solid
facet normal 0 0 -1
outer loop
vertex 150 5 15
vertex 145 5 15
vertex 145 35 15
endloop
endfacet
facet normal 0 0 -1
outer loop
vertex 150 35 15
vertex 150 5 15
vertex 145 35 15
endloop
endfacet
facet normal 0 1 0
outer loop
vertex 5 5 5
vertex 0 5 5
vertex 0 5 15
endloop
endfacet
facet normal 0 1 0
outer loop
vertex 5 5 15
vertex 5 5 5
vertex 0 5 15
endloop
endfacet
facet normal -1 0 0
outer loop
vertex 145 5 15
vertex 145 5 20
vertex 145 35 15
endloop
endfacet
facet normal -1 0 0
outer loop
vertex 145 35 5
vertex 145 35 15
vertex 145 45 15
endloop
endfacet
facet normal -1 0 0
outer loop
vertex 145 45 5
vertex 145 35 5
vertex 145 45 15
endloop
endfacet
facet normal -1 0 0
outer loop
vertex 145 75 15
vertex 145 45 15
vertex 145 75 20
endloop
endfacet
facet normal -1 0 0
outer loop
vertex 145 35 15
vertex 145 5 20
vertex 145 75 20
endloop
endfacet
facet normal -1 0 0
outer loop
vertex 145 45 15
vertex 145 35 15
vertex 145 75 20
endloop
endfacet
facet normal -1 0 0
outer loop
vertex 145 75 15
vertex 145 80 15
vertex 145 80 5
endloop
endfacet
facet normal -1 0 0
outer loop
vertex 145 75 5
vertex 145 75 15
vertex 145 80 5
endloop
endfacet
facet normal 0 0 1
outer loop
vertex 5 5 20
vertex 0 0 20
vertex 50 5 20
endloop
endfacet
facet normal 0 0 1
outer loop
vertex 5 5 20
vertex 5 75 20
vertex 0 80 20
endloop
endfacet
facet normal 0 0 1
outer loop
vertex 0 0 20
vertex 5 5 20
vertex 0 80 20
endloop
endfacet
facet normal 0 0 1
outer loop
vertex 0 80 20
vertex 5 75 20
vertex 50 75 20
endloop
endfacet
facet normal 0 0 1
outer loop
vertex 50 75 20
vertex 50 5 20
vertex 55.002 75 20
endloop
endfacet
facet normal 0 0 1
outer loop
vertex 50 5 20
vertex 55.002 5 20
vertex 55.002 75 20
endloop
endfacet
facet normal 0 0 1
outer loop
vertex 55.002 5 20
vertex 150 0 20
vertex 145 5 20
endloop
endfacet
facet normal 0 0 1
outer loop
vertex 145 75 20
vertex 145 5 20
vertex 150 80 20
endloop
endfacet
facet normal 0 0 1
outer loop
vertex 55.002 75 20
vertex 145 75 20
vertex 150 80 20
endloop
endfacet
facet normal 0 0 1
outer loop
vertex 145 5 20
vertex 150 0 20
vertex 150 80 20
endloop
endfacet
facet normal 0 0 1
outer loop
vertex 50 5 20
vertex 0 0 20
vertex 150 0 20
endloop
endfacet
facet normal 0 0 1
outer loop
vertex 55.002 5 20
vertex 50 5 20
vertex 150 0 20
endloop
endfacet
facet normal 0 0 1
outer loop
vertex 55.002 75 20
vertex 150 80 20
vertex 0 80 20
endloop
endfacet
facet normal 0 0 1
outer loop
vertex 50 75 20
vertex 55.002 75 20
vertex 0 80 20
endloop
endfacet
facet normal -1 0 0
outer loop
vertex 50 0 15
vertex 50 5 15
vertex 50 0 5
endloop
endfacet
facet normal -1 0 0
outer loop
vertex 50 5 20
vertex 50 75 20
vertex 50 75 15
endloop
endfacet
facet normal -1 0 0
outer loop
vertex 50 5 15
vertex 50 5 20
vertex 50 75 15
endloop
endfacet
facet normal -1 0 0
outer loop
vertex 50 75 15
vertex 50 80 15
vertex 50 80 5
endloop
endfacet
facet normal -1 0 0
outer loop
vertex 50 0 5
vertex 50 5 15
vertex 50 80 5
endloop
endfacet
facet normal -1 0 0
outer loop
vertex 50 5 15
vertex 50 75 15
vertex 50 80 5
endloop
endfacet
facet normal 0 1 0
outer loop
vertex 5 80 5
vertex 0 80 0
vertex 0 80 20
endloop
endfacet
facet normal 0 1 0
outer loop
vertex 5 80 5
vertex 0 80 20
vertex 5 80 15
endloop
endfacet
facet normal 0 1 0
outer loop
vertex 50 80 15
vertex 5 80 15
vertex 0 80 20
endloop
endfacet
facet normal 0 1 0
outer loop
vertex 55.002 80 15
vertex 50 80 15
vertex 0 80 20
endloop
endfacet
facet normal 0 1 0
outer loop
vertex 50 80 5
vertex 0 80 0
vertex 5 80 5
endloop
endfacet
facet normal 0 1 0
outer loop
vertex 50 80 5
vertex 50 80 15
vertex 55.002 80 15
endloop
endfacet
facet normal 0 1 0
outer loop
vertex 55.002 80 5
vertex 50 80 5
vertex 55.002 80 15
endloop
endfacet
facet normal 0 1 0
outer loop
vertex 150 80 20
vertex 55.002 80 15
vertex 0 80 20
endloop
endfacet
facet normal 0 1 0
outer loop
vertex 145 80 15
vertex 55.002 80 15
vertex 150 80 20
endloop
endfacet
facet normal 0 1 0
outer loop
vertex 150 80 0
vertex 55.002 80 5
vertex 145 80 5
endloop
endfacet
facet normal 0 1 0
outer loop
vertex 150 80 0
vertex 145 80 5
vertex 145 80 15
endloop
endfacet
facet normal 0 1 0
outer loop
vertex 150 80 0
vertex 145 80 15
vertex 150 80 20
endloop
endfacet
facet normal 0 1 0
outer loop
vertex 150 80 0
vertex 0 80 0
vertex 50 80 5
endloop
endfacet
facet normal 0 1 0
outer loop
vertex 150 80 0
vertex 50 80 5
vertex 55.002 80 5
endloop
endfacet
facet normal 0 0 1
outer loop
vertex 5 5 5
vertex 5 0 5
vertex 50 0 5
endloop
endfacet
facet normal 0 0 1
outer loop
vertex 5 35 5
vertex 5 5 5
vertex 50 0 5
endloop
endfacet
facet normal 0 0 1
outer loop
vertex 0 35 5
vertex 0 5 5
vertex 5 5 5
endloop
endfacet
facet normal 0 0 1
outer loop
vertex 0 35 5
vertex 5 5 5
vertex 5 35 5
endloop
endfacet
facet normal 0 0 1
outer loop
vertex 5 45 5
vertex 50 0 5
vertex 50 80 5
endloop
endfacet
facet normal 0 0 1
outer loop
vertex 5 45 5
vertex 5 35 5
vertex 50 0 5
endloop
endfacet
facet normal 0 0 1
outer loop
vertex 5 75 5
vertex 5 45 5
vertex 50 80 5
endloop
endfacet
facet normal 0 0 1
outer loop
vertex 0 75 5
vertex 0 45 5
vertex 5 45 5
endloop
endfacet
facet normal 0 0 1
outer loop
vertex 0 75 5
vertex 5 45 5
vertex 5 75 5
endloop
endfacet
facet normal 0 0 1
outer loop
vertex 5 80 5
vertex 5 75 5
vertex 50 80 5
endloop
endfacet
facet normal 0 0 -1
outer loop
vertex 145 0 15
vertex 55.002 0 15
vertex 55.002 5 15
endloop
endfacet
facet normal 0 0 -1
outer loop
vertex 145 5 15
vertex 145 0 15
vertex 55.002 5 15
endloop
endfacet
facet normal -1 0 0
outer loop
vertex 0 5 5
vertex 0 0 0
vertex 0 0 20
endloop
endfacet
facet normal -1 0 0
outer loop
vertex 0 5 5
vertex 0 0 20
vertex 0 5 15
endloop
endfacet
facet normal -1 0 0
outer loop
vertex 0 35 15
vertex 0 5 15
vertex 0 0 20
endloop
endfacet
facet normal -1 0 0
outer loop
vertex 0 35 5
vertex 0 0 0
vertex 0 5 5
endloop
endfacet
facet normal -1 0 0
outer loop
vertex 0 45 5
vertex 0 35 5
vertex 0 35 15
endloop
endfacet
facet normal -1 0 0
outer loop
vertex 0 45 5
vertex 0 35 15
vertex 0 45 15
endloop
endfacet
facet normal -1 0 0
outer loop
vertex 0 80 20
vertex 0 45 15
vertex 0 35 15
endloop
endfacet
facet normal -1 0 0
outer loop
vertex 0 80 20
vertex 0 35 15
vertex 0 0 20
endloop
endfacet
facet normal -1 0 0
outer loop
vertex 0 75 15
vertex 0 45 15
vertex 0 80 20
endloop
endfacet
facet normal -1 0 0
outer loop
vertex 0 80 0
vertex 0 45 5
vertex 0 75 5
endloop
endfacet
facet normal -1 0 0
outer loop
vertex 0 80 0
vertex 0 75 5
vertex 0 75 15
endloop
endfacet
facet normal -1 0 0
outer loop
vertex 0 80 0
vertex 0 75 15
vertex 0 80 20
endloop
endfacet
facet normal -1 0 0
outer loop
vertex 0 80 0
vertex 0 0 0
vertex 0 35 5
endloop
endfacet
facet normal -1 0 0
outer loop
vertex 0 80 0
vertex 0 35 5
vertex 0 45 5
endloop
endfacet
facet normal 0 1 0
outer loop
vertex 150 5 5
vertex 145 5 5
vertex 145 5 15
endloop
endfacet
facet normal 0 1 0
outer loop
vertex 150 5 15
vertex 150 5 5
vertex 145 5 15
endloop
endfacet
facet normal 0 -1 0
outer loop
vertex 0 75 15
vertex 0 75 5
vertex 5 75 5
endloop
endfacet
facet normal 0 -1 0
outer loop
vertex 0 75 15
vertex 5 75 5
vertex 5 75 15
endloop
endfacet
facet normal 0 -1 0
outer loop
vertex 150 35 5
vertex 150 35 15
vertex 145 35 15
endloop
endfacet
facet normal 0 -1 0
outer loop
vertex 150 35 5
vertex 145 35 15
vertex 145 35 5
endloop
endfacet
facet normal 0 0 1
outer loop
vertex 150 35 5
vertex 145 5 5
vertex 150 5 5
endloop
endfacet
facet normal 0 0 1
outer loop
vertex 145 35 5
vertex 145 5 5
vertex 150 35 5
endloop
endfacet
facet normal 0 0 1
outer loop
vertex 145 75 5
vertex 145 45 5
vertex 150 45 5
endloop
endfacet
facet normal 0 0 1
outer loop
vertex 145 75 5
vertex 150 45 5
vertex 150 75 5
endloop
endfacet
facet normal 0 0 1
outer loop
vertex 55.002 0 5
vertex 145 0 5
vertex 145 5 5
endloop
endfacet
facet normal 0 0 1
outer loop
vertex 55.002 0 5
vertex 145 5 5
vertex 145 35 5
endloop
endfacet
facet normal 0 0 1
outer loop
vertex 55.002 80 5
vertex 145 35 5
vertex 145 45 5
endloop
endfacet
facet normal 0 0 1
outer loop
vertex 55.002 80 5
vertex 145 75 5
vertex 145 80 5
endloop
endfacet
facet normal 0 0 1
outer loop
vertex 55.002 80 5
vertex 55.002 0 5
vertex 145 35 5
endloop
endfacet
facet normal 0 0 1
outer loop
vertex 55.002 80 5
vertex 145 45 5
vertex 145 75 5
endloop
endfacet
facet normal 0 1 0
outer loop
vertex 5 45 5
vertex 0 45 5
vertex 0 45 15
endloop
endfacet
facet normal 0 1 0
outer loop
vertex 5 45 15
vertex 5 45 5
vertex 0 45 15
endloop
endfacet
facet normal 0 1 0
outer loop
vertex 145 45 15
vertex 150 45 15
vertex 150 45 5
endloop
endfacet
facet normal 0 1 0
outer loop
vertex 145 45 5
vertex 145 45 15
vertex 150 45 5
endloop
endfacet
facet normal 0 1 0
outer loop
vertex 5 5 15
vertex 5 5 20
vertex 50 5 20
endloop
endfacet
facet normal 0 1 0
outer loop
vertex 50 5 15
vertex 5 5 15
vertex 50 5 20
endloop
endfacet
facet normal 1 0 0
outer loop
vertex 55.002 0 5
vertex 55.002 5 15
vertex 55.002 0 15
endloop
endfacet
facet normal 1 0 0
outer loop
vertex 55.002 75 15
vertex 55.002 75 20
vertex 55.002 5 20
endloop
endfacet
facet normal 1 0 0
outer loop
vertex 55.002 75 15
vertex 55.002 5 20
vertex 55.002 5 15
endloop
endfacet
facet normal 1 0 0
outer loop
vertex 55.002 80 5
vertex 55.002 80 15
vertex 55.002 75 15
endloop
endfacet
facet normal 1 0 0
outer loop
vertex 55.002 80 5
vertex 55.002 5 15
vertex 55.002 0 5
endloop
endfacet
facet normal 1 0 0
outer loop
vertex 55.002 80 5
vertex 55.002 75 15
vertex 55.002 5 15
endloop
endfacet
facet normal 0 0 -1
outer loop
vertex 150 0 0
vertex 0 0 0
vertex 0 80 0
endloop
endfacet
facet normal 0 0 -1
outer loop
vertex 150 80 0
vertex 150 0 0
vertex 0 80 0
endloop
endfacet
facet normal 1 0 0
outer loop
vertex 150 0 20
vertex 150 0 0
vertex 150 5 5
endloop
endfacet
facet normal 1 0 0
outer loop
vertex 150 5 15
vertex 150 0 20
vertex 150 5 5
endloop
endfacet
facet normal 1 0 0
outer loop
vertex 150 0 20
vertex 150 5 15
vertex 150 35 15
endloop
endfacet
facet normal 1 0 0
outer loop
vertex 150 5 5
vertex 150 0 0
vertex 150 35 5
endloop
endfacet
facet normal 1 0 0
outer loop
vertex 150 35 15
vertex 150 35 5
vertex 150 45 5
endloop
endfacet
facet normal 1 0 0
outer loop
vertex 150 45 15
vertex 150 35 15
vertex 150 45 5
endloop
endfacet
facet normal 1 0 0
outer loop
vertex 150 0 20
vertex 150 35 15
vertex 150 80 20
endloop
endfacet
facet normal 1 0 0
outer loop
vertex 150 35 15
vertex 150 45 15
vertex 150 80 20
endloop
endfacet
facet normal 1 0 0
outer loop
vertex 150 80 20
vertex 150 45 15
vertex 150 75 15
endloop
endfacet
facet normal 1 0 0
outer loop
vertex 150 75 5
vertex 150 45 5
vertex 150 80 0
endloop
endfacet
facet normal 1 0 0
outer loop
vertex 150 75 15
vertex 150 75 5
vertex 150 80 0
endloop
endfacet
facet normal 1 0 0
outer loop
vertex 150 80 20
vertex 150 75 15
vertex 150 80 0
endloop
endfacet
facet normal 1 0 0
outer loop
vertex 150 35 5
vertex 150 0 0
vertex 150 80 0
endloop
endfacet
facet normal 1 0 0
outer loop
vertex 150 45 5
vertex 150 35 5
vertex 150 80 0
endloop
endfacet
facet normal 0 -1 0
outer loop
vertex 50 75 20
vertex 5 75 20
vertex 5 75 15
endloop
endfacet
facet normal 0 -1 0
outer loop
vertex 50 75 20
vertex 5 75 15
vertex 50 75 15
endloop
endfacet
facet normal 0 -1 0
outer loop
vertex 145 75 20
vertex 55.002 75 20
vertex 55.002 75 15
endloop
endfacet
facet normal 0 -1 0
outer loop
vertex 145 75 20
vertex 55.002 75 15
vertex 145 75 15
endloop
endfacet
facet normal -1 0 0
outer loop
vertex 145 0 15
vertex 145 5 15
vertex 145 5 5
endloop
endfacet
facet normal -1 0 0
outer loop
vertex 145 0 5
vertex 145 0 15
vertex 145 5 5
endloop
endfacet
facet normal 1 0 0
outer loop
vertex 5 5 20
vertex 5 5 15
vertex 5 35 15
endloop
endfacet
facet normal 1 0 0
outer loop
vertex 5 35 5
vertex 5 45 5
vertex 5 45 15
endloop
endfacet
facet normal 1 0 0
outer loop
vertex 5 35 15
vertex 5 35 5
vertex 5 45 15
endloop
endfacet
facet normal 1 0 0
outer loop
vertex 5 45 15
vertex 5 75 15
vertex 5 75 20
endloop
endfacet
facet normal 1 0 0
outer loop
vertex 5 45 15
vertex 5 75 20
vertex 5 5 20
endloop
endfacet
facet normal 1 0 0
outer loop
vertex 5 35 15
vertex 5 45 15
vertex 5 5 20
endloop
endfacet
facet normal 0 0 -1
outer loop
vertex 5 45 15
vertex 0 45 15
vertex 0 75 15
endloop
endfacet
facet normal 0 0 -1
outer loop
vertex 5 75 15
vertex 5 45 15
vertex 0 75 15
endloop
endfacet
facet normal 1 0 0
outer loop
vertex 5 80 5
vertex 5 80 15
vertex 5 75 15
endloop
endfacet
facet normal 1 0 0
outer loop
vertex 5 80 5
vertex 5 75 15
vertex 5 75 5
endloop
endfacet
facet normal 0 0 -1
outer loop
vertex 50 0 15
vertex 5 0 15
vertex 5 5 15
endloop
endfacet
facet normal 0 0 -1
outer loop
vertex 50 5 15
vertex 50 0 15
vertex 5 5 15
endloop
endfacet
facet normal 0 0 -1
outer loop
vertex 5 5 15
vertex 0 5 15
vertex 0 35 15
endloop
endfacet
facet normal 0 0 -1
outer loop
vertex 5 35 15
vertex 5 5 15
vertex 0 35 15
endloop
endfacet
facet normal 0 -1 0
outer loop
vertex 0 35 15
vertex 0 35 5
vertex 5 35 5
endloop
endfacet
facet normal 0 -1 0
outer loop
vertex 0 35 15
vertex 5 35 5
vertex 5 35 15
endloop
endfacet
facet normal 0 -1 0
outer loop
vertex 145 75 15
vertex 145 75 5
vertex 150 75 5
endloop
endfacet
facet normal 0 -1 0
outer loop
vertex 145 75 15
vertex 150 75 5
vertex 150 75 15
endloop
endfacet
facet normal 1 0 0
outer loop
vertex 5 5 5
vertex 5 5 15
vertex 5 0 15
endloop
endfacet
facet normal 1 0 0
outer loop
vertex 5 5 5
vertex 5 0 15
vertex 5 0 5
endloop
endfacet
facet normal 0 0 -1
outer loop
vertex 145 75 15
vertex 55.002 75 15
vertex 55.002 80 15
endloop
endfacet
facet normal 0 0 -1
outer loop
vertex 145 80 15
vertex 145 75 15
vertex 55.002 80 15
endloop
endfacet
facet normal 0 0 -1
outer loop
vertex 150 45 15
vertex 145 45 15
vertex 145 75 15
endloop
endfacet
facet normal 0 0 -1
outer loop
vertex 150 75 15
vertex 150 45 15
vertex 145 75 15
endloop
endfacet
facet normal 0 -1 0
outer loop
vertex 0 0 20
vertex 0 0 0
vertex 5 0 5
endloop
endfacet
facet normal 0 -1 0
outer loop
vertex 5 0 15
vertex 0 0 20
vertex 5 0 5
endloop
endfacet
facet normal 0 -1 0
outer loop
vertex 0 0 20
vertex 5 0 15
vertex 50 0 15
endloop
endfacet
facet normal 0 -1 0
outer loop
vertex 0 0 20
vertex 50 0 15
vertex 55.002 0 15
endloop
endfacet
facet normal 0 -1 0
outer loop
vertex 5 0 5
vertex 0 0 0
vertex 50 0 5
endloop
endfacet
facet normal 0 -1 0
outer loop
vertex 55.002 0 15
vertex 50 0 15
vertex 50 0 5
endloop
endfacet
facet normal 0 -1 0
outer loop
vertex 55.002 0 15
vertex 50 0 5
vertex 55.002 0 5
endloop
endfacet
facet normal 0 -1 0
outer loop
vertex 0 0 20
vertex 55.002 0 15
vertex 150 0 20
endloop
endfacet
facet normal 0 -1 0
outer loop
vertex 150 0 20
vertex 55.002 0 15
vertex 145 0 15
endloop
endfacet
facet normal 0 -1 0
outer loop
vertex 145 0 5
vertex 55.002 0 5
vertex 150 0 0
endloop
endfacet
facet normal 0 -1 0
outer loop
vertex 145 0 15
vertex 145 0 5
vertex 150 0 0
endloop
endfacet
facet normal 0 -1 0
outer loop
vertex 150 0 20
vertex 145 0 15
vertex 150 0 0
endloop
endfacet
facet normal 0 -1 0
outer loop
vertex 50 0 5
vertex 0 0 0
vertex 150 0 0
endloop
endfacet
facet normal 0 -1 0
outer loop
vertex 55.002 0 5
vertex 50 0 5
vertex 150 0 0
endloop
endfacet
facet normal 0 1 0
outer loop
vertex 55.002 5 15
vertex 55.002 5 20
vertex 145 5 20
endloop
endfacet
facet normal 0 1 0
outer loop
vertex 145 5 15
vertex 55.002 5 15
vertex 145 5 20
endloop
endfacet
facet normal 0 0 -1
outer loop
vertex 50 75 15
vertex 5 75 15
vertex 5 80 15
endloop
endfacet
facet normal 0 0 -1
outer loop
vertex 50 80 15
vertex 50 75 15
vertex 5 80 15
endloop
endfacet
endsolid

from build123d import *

# Parameters (mm, degrees)
ESBO_O1_W                = 150
ESBO_O1_H                = 80
RESSALTO_EXTRUS_O1_DEPTH = 20
ESBO_O2_W                = 140
ESBO_O2_H                = 10
CORTE_EXTRUS_O1_DEPTH    = 172.172427686
ESBO_O3_W                = 10
ESBO_O3_H                = 70
CORTE_EXTRUS_O2_DEPTH    = 172.172427686
ESBO_O4_W                = 45
ESBO_O4_H                = 70
ESBO_O4_W_2              = 90
CORTE_EXTRUS_O3_DEPTH    = 15
ESBO_O5_W                = 5.002119461
ESBO_O5_H                = 20
RESSALTO_EXTRUS_O2_DEPTH = 80
ESBO_O6_W                = 20
ESBO_O6_H                = 10
RESSALTO_EXTRUS_O3_DEPTH = 5
ESBO_O7_W                = 20
ESBO_O7_H                = 10
RESSALTO_EXTRUS_O4_DEPTH = 5


with BuildPart() as part:
    # Esboço1 → Ressalto-extrusão1 (new body)
    with BuildSketch(Plane.XY):
        with Locations((75, 40)):
            Rectangle(ESBO_O1_W, ESBO_O1_H)
    extrude(amount=RESSALTO_EXTRUS_O1_DEPTH)

    # Esboço2 → Corte-extrusão1 (cut, through all)
    with BuildSketch(Plane(origin=(0, 80, 0), x_dir=(1, 0, 0), z_dir=(0, 1, 0))):
        with Locations((75, -10)):
            Rectangle(ESBO_O2_W, ESBO_O2_H)
    extrude(amount=-CORTE_EXTRUS_O1_DEPTH, mode=Mode.SUBTRACT)

    # Esboço3 → Corte-extrusão2 (cut, through all)
    with BuildSketch(Plane.ZY):
        with Locations((10, 40)):
            Rectangle(ESBO_O3_W, ESBO_O3_H)
    extrude(amount=-CORTE_EXTRUS_O2_DEPTH, mode=Mode.SUBTRACT)

    # Esboço4 → Corte-extrusão3 (cut)
    with BuildSketch(Plane.XY.offset(20)):
        with Locations((27.5, 40)):
            Rectangle(ESBO_O4_W, ESBO_O4_H)
        with Locations((100, 40)):
            Rectangle(ESBO_O4_W_2, ESBO_O4_H)
    extrude(amount=-CORTE_EXTRUS_O3_DEPTH, mode=Mode.SUBTRACT)

    # Esboço5 → Ressalto-extrusão2 (add)
    with BuildSketch(Plane(origin=(0, 80, 0), x_dir=(1, 0, 0), z_dir=(0, 1, 0))):
        with Locations((52.501059731, -10)):
            Rectangle(ESBO_O5_W, ESBO_O5_H)
    extrude(amount=-RESSALTO_EXTRUS_O2_DEPTH)

    # Esboço6 → Ressalto-extrusão3 (add)
    with BuildSketch(Plane.ZY):
        with Locations((10, 40)):
            Rectangle(ESBO_O6_W, ESBO_O6_H)
    extrude(amount=-RESSALTO_EXTRUS_O3_DEPTH)

    # Esboço7 → Ressalto-extrusão4 (add)
    with BuildSketch(Plane(origin=(150, 0, 0), x_dir=(0, 0, -1), z_dir=(1, 0, 0))):
        with Locations((-10, 40)):
            Rectangle(ESBO_O7_W, ESBO_O7_H)
    extrude(amount=-RESSALTO_EXTRUS_O4_DEPTH)


solid = part.part
